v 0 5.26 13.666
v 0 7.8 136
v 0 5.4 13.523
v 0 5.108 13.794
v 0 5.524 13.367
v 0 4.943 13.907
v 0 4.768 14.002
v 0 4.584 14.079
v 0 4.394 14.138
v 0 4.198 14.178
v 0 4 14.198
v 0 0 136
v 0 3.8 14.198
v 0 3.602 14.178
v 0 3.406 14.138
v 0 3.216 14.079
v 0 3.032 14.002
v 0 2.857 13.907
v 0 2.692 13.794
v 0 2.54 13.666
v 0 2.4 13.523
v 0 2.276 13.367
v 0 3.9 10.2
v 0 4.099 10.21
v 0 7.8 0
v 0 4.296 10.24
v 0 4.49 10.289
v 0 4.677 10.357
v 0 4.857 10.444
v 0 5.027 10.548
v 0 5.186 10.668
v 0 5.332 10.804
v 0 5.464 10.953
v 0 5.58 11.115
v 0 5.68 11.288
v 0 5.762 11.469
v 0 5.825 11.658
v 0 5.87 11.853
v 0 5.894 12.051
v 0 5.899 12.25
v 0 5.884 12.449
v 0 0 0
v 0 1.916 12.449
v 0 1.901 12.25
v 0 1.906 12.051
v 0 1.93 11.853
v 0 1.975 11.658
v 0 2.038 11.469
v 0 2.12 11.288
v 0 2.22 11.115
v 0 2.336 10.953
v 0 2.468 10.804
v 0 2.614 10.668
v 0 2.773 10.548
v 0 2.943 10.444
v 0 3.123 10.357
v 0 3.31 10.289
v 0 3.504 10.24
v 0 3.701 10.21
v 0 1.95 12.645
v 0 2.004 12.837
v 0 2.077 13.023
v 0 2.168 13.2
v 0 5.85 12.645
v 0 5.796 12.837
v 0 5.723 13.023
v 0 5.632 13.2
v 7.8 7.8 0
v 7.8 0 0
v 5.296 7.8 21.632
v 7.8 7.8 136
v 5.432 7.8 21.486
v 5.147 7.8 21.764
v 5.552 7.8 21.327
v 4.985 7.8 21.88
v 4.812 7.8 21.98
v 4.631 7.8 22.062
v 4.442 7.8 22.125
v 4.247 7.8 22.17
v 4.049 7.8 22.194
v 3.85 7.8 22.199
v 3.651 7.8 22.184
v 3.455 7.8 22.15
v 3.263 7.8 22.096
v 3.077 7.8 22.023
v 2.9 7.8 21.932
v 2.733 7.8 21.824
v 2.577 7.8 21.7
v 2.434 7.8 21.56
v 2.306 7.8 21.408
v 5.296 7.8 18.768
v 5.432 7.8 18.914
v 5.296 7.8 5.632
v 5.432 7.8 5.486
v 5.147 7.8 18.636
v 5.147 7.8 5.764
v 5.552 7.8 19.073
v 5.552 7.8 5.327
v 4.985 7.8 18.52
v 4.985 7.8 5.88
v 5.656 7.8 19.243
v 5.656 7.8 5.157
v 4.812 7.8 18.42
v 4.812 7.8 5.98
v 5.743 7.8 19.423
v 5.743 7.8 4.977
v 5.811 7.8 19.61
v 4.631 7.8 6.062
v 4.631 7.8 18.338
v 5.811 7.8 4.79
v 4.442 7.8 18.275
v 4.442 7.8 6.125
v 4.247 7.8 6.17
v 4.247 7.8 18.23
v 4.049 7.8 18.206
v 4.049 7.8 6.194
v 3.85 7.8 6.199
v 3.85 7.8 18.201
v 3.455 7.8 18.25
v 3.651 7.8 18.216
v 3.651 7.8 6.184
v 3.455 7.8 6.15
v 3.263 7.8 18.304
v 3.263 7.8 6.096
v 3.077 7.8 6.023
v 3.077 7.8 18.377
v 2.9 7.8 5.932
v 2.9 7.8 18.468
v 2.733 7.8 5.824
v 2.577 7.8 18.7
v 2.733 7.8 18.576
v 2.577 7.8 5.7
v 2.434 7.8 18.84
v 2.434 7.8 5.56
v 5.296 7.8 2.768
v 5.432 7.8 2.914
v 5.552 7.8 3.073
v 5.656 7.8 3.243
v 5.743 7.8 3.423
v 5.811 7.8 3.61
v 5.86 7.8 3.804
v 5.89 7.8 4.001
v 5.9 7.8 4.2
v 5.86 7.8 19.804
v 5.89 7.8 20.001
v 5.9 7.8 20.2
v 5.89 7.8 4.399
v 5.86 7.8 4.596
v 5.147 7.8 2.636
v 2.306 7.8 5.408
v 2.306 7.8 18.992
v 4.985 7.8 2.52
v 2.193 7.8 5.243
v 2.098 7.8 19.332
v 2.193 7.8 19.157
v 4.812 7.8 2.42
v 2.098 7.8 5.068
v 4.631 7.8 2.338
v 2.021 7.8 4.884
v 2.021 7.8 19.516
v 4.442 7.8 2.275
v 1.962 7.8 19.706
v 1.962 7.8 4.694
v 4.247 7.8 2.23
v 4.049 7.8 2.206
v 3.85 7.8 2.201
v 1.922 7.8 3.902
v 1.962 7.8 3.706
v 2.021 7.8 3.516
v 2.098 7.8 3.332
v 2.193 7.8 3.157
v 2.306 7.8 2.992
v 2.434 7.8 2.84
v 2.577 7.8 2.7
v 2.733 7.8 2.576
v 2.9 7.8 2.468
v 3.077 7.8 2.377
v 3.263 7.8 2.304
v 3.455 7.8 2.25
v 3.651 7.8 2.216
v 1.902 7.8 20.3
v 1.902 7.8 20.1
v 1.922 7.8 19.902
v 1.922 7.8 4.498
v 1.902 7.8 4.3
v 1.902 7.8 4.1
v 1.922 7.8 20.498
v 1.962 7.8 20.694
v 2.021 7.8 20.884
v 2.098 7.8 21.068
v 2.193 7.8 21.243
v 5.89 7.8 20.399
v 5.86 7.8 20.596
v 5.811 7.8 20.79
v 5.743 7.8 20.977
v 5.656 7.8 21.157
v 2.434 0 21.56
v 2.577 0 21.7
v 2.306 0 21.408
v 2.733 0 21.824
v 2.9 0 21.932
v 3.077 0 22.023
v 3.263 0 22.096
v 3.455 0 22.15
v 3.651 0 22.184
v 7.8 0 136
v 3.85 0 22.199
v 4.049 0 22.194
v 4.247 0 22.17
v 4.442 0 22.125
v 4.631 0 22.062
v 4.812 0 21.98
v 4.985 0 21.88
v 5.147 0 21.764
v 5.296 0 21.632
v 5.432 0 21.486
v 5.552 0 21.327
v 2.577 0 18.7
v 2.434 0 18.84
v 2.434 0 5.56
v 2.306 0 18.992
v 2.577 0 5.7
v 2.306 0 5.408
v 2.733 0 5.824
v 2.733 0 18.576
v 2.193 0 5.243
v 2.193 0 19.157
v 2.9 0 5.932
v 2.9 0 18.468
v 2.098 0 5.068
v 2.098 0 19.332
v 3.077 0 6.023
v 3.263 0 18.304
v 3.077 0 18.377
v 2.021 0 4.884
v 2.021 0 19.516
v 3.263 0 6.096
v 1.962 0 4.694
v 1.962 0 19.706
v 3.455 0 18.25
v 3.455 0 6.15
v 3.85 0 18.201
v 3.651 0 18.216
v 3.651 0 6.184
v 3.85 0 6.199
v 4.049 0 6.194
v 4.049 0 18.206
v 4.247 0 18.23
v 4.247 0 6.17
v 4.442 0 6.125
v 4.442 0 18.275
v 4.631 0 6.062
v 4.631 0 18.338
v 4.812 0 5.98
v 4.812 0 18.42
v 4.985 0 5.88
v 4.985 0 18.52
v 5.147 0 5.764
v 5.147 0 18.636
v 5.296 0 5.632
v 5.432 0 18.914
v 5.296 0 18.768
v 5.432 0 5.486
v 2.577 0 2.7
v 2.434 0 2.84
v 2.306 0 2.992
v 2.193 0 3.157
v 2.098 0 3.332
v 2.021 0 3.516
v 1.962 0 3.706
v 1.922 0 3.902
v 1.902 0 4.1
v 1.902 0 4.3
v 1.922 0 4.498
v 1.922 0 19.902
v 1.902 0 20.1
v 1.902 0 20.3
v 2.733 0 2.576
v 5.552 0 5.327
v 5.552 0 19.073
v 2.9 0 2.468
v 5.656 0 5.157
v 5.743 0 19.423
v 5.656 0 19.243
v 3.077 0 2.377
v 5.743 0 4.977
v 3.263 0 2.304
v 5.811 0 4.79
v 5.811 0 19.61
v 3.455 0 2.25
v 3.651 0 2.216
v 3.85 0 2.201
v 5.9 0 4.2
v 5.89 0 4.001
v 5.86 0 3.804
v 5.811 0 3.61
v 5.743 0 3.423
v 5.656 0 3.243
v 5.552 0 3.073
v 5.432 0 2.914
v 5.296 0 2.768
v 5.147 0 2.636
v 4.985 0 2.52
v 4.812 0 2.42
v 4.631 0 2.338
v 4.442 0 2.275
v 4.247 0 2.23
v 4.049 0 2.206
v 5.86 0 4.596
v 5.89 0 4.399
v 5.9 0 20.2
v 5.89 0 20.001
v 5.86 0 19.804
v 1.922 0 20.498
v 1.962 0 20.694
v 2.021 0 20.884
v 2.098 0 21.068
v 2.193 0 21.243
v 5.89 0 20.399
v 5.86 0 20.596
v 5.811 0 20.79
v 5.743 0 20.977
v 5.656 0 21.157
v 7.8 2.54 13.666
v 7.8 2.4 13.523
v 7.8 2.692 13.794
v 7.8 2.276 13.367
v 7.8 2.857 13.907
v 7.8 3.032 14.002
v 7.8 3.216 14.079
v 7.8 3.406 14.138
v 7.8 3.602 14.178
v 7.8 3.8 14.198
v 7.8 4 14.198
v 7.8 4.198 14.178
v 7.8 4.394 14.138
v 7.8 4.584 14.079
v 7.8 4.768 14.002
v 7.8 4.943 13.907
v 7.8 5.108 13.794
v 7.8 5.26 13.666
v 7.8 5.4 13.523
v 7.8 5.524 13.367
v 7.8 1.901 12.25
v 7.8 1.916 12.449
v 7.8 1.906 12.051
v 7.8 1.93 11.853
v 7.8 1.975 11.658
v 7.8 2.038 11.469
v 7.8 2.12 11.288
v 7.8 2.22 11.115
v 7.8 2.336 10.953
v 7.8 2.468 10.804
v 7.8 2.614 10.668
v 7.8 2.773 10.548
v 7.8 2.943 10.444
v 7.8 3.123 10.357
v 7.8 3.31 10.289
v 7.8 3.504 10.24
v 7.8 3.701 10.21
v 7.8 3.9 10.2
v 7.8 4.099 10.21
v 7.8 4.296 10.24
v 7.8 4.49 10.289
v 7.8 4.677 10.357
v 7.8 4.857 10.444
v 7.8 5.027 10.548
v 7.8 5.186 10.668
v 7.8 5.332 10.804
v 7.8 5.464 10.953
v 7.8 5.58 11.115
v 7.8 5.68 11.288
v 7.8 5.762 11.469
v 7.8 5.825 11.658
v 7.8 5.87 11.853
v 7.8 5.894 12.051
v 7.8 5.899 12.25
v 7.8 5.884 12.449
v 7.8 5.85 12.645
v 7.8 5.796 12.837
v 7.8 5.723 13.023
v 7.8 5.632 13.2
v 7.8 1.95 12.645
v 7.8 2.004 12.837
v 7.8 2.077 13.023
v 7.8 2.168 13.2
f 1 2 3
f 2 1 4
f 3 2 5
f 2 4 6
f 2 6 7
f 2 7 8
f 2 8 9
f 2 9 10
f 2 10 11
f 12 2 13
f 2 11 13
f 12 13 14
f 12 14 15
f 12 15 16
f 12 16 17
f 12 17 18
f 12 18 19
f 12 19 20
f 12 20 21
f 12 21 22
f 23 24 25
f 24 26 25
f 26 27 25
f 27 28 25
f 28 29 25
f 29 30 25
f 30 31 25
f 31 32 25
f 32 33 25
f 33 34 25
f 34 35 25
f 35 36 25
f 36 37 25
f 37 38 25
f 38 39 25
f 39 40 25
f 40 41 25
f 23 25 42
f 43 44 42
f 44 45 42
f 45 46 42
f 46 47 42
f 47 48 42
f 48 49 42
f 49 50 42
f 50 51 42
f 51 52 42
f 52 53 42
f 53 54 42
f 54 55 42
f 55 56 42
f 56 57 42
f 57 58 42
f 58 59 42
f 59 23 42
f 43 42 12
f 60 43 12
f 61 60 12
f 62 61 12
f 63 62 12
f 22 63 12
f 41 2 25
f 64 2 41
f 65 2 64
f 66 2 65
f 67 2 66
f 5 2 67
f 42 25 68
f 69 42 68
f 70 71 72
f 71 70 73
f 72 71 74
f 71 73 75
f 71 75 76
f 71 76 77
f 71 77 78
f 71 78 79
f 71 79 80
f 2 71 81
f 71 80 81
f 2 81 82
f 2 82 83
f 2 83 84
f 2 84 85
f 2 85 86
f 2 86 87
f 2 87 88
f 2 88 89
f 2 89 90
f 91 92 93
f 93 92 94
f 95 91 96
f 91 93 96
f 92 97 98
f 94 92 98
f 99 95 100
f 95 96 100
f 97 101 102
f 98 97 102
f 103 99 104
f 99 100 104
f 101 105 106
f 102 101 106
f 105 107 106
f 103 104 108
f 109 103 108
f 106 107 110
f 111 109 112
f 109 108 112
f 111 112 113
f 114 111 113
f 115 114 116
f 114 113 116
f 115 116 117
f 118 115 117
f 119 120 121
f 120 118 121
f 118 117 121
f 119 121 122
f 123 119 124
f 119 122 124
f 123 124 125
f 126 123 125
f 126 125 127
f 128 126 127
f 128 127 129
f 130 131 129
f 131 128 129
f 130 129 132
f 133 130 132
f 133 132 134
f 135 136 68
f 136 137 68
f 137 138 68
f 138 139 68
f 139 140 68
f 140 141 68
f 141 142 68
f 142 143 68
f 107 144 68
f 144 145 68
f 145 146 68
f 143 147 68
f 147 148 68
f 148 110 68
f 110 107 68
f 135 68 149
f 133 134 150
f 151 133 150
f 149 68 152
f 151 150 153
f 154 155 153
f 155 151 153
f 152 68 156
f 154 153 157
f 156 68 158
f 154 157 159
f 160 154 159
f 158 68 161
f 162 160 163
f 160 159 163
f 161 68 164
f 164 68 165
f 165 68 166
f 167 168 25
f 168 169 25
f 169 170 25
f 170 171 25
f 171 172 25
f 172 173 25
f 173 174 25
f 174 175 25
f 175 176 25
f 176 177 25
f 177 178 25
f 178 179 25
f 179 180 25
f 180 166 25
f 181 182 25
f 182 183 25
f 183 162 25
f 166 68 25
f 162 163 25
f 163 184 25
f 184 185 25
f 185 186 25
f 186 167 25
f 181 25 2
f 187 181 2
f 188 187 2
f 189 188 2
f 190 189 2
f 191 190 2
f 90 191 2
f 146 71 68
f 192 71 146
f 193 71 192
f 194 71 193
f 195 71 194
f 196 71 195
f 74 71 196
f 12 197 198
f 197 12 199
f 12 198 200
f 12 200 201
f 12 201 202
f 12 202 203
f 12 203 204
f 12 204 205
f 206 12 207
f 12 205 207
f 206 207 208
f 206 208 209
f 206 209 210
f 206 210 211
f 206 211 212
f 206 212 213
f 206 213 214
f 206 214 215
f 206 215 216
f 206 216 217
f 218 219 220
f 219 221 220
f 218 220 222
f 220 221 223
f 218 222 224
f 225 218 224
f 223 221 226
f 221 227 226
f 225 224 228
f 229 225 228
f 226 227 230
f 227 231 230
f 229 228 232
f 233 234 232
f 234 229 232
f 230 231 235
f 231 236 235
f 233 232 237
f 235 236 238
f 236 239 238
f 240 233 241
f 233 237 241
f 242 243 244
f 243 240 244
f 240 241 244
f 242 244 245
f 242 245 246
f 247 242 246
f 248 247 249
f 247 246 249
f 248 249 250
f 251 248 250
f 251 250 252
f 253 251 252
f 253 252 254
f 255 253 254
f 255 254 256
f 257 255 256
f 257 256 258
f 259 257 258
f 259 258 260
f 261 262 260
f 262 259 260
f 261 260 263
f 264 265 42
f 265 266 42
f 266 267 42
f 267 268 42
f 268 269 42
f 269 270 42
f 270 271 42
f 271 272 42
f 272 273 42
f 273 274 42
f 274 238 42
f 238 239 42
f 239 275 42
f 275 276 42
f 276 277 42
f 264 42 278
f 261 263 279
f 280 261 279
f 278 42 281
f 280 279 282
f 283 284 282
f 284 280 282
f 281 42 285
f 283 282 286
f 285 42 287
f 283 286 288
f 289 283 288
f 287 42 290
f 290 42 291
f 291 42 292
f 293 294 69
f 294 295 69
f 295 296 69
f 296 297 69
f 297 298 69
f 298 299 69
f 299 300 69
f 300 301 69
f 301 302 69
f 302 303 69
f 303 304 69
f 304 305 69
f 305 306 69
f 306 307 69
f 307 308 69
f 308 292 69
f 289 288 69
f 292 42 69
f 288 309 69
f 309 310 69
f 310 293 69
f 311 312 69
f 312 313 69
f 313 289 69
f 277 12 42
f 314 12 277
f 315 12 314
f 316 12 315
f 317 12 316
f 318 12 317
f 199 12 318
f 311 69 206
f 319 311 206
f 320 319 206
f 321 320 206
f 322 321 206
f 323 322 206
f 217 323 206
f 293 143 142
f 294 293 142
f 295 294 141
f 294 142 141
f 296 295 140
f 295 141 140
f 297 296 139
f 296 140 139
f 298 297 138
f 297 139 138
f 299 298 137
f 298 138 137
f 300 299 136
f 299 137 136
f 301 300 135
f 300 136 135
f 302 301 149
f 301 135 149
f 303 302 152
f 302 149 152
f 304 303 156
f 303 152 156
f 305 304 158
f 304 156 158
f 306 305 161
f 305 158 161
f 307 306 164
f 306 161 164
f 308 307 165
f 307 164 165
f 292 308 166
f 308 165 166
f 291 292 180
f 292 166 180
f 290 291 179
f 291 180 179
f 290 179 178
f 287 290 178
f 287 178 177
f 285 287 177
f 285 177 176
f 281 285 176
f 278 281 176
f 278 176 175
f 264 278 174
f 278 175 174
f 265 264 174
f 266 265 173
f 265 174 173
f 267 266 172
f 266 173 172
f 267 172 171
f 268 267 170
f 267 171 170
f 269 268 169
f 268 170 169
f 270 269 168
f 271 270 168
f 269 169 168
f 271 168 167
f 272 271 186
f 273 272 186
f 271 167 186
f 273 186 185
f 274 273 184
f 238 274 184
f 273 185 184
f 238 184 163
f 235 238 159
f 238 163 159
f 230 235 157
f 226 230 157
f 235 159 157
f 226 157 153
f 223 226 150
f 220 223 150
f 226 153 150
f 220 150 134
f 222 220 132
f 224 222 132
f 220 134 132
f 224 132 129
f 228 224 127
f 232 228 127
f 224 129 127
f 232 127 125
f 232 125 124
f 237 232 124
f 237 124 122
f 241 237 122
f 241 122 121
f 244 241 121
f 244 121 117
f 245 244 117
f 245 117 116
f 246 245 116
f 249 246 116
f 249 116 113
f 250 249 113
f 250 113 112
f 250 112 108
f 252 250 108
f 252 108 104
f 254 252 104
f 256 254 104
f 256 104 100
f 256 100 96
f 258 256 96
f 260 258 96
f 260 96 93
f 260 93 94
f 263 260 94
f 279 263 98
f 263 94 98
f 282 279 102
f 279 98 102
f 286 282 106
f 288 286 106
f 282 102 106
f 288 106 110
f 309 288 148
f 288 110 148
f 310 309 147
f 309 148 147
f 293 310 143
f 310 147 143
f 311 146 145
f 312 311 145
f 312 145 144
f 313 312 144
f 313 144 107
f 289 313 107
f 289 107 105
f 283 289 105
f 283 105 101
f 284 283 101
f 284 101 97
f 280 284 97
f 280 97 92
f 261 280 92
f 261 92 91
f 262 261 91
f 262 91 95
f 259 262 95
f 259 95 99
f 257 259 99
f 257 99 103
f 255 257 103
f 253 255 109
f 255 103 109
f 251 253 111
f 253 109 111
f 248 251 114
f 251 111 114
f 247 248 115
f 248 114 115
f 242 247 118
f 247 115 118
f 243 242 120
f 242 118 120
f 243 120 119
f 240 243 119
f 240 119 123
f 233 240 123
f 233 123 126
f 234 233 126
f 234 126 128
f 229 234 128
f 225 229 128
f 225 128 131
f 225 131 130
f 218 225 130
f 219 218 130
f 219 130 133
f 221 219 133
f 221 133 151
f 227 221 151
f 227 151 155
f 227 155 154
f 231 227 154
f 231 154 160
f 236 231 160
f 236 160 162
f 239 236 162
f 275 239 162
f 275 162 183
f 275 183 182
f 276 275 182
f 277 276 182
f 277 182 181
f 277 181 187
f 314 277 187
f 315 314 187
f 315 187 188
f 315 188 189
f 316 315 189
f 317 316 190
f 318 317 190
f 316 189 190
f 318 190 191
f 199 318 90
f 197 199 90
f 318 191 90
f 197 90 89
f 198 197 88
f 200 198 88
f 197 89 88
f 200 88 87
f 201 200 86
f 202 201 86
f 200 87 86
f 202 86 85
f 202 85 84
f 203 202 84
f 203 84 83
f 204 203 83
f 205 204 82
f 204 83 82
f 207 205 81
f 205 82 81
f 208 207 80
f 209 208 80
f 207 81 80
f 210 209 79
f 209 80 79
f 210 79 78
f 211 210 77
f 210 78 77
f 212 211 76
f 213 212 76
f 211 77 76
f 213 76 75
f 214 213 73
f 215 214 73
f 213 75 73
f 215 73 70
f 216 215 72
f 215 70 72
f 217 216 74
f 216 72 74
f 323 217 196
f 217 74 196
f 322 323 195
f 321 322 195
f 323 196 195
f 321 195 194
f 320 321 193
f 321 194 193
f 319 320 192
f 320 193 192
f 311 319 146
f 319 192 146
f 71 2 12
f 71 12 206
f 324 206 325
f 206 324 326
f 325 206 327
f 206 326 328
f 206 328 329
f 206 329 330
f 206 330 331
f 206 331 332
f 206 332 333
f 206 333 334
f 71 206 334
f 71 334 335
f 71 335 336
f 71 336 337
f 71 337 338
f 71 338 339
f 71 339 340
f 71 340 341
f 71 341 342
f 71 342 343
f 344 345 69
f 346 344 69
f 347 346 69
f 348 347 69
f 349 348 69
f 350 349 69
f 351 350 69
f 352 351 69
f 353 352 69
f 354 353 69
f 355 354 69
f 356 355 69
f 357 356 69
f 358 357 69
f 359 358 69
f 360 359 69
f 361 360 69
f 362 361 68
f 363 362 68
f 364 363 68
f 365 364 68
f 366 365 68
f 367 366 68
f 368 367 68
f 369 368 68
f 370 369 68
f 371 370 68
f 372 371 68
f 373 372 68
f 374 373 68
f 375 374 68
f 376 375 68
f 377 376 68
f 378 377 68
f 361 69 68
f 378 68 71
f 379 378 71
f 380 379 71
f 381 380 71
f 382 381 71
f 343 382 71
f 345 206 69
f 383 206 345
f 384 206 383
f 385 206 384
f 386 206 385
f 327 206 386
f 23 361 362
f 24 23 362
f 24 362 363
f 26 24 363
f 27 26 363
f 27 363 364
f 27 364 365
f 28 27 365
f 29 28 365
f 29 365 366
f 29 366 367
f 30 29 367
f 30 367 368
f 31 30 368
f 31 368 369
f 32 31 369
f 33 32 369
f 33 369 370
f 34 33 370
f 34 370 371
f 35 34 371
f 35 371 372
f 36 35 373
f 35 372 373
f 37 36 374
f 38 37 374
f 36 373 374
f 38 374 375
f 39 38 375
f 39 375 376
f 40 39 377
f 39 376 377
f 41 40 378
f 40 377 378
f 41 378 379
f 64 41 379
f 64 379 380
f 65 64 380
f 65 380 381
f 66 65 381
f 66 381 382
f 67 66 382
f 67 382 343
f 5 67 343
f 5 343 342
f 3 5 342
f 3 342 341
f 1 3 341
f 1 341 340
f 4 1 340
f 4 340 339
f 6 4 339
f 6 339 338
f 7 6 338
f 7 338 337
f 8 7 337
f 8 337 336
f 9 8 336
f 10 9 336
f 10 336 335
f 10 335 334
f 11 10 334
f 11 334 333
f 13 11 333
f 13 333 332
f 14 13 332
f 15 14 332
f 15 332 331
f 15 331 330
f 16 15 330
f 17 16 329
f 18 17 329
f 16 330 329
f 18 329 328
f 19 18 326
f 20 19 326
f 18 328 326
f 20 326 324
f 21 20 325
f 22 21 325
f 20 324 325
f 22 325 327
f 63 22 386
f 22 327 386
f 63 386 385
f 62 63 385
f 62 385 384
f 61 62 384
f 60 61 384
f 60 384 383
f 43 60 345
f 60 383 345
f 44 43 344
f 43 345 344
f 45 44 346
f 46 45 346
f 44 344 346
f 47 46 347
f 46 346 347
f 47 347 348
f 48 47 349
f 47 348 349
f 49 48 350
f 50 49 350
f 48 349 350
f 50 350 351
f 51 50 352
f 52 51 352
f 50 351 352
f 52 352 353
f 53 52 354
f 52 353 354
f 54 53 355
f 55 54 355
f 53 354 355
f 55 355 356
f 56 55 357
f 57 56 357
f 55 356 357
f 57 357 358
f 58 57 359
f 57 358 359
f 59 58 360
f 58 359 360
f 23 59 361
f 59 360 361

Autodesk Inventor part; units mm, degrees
ref_plane "YZ Plane" through (0, 0, 0) normal (1, 0, 0) x (0, 1, 0)
ref_plane "XZ Plane" through (0, 0, 0) normal (0, 1, 0) x (-1, 0, 0)
ref_plane "XY Plane" through (0, 0, 0) normal (0, 0, 1) x (1, 0, 0)
sketch "Sketch1" plane through (0, 0, 0) normal (0, 0, 1) x (1, 0, 0)
  line L0 (0, 0) -> (7.8, 0)
  line L1 (7.8, 0) -> (7.8, 7.8)
  line L2 (7.8, 7.8) -> (0, 7.8)
  line L3 (0, 7.8) -> (0, 0)
  dimension "d0" = 7.8
  dimension "d1" = 7.8
extrude "Extrusion1" add sketch "Sketch1" along normal blind 136
sketch "Sketch2" plane through (0, 7.8, 0) normal (0, 1, 0) x (1, 0, 0)
  line L0 (0, 0) -> (3.9, 0)
  line L1 (7.8, 0) -> (0, 0) projected
  line L2 (3.9, 0) -> (3.9, -2.2)
  line L3 (3.9, -2.2) -> (3.9, -4.2)
  circle A0 centre (3.9, -4.2) radius 2
  dimension "d4" = 2.2
  dimension "d5" = 2
  dimension "d6" = 4
extrude "Extrusion2" cut sketch "Sketch2" against normal blind 136
sketch "Sketch3" plane through (7.8, 0, 0) normal (1, 0, 0) x (0, 0, -1)
  line L0 (0, 0) -> (0, 7.8) projected
  line L1 (0, 7.8) -> (0, 3.9)
  line L2 (0, 3.9) -> (-10.2, 3.9)
  line L3 (-10.2, 3.9) -> (-12.2, 3.9)
  circle A0 centre (-12.2, 3.9) radius 2
  dimension "d9" = 10.2
  dimension "d10" = 2
extrude "Extrusion3" cut sketch "Sketch3" against normal blind 136
sketch "Sketch4" plane through (0, 7.8, 0) normal (0, 1, 0) x (1, 0, 0)
  circle A0 centre (3.9, -4.2) radius 2 projected
  line L0 (3.9, -6.2) -> (3.9, -8.4)
  line L1 (0, 0) -> (7.8, 0) projected
  line L2 (7.8, -10.2) -> (0, -10.2) projected
  line L3 (3.9, -8.4) -> (3.9, -10.4)
  line L4 (3.9, -6.2) -> (3.9, -18.2)
  line L5 (3.9, -18.2) -> (3.9, -20.2)
  circle A1 centre (3.9, -20.2) radius 2
  dimension "d13" = 2.2
  dimension "d15" = 2
  dimension "d16" = 12
  dimension "d17" = 2
extrude "Extrusion4" cut sketch "Sketch4" against normal blind 136 contours A1
ref_plane "Work Plane1" through (0, 0, 68) normal (0, 0, -1) x (-1, 0, 0)
ref_plane "Work Plane2" through (0, 3.9, 0) normal (0, 1, 0) x (1, 0, 0)
